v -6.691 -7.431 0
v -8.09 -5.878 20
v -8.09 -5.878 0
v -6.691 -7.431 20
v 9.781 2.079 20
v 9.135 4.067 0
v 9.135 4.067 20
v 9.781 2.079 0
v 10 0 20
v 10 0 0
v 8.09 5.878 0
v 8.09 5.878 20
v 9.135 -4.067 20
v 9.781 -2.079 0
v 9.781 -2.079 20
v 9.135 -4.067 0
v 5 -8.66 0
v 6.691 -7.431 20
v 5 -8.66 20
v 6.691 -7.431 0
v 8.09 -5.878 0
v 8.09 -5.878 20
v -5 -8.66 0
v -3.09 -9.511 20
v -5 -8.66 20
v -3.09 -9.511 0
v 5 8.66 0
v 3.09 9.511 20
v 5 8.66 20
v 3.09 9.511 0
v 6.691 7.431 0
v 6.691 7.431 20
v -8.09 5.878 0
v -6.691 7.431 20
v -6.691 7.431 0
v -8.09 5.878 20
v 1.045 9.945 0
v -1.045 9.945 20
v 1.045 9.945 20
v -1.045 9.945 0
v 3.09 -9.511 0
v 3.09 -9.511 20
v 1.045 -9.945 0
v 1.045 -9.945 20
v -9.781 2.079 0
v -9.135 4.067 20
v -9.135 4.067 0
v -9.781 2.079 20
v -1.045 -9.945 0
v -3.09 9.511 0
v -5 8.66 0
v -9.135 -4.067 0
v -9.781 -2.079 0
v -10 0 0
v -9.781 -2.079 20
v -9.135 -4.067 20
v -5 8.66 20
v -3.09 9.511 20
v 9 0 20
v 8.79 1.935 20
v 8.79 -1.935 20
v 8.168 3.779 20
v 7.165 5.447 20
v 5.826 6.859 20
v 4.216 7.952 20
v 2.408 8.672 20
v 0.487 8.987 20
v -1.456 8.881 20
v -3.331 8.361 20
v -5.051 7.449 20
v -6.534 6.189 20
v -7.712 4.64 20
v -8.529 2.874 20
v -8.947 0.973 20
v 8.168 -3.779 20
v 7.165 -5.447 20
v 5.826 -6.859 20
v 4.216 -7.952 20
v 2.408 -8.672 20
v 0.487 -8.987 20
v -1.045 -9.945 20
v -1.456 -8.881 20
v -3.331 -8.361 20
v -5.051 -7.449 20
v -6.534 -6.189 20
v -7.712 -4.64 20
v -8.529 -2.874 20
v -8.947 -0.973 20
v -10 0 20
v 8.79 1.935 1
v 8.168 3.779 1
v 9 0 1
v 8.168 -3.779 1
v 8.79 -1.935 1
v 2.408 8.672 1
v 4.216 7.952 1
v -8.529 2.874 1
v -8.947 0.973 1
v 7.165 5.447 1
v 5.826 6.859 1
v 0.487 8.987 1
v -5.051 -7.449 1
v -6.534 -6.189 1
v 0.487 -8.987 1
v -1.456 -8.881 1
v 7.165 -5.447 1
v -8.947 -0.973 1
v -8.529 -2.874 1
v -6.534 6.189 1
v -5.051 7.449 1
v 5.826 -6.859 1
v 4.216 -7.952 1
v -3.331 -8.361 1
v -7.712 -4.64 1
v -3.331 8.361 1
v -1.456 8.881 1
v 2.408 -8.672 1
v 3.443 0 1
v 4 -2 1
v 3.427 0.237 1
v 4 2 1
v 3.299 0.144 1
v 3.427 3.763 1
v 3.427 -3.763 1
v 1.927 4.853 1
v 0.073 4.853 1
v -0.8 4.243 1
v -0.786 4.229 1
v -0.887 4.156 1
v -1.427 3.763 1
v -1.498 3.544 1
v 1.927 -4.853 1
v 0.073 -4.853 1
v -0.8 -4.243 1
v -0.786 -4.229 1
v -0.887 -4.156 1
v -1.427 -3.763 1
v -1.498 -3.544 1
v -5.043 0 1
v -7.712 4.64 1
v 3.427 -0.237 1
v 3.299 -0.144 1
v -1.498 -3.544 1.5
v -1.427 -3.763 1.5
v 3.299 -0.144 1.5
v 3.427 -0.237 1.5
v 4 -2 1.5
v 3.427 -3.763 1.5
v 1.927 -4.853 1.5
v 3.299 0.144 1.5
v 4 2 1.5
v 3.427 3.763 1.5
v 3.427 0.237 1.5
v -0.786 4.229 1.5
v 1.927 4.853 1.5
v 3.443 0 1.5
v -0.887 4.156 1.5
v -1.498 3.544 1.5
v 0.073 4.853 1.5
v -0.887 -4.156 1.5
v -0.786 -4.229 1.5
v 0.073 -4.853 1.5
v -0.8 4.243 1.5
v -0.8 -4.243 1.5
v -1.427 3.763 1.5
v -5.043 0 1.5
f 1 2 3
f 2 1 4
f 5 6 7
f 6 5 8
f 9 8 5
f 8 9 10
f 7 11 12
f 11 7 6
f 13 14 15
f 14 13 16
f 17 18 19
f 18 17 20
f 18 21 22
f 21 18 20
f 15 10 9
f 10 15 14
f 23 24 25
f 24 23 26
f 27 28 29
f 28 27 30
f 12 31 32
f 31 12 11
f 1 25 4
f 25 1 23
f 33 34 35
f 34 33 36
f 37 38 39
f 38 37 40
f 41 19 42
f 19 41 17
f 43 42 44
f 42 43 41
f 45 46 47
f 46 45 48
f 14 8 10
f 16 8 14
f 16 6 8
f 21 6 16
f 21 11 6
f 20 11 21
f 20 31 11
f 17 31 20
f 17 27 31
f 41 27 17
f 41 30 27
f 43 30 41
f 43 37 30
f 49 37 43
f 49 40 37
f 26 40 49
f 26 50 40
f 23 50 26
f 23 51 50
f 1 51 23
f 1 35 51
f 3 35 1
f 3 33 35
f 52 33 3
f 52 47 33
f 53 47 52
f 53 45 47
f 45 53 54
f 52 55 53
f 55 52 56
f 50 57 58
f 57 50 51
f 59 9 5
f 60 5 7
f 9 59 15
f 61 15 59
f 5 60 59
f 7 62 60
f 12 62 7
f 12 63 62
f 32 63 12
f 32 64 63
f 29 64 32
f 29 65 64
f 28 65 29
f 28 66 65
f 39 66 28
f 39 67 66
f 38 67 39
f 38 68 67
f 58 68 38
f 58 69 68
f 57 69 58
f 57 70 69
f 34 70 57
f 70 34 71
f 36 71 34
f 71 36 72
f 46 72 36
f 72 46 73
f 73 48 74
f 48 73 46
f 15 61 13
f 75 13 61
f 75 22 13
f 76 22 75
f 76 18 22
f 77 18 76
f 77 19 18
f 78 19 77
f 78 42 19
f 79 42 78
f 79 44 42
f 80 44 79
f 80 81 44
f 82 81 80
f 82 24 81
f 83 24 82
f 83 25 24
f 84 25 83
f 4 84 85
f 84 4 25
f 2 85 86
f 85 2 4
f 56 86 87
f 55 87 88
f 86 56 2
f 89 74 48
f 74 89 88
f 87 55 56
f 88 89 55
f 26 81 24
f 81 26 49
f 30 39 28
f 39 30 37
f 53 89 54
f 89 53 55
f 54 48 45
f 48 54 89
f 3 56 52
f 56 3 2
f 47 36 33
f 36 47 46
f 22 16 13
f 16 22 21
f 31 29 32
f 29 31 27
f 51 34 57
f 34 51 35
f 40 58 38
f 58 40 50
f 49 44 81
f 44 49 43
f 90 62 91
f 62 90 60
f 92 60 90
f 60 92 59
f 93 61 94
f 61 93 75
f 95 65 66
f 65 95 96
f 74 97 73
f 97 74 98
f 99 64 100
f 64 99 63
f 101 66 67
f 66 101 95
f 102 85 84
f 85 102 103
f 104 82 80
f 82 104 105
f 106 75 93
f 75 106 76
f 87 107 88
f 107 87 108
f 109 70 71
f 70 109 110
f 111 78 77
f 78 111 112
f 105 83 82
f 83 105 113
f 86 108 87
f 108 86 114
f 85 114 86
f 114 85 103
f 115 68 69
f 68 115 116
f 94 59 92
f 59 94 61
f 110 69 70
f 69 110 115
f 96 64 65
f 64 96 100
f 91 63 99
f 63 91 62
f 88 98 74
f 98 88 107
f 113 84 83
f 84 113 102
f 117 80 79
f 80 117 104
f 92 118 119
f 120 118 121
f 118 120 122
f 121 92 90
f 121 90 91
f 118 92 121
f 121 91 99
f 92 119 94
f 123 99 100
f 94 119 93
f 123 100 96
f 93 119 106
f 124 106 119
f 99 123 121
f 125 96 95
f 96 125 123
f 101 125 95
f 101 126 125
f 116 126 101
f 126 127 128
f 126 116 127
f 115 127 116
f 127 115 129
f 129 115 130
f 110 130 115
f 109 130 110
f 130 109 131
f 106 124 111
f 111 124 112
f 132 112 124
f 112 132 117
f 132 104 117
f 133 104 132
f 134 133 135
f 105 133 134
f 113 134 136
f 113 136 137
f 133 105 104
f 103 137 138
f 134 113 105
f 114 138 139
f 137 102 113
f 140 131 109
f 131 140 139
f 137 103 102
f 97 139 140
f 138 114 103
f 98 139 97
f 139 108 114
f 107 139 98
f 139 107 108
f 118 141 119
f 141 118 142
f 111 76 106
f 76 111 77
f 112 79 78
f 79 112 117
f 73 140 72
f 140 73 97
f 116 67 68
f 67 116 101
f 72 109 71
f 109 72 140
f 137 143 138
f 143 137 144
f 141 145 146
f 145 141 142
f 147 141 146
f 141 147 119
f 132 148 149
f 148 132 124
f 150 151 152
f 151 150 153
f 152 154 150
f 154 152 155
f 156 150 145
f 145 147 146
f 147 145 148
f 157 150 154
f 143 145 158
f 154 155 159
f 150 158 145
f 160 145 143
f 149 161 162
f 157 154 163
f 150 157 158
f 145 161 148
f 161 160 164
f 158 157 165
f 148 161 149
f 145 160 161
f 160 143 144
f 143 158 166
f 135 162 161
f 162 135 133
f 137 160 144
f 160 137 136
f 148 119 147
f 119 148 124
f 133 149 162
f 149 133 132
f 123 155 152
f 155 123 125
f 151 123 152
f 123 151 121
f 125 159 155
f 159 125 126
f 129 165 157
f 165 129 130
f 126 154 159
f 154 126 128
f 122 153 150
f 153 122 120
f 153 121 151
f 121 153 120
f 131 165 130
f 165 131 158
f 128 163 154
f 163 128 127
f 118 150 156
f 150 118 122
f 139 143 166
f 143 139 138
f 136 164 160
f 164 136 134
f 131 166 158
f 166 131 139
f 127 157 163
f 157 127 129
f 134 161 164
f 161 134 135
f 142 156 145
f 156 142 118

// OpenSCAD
difference() {
        cylinder (h = 20, r=10, center = false);
        translate([0,0,1]) cylinder (h = 21, r=9, center = false);
}

translate([1, 0, 1]) {
    translate([0, -2, 0]) cylinder(h = 1, r = 3, center=true);
    translate([0, 2, 0]) cylinder(h = 1, r = 3, center=true);
    translate([-1.8, 0, 0]) rotate([0, 0, 45]) cube([6, 6, 1], center=true);
}
